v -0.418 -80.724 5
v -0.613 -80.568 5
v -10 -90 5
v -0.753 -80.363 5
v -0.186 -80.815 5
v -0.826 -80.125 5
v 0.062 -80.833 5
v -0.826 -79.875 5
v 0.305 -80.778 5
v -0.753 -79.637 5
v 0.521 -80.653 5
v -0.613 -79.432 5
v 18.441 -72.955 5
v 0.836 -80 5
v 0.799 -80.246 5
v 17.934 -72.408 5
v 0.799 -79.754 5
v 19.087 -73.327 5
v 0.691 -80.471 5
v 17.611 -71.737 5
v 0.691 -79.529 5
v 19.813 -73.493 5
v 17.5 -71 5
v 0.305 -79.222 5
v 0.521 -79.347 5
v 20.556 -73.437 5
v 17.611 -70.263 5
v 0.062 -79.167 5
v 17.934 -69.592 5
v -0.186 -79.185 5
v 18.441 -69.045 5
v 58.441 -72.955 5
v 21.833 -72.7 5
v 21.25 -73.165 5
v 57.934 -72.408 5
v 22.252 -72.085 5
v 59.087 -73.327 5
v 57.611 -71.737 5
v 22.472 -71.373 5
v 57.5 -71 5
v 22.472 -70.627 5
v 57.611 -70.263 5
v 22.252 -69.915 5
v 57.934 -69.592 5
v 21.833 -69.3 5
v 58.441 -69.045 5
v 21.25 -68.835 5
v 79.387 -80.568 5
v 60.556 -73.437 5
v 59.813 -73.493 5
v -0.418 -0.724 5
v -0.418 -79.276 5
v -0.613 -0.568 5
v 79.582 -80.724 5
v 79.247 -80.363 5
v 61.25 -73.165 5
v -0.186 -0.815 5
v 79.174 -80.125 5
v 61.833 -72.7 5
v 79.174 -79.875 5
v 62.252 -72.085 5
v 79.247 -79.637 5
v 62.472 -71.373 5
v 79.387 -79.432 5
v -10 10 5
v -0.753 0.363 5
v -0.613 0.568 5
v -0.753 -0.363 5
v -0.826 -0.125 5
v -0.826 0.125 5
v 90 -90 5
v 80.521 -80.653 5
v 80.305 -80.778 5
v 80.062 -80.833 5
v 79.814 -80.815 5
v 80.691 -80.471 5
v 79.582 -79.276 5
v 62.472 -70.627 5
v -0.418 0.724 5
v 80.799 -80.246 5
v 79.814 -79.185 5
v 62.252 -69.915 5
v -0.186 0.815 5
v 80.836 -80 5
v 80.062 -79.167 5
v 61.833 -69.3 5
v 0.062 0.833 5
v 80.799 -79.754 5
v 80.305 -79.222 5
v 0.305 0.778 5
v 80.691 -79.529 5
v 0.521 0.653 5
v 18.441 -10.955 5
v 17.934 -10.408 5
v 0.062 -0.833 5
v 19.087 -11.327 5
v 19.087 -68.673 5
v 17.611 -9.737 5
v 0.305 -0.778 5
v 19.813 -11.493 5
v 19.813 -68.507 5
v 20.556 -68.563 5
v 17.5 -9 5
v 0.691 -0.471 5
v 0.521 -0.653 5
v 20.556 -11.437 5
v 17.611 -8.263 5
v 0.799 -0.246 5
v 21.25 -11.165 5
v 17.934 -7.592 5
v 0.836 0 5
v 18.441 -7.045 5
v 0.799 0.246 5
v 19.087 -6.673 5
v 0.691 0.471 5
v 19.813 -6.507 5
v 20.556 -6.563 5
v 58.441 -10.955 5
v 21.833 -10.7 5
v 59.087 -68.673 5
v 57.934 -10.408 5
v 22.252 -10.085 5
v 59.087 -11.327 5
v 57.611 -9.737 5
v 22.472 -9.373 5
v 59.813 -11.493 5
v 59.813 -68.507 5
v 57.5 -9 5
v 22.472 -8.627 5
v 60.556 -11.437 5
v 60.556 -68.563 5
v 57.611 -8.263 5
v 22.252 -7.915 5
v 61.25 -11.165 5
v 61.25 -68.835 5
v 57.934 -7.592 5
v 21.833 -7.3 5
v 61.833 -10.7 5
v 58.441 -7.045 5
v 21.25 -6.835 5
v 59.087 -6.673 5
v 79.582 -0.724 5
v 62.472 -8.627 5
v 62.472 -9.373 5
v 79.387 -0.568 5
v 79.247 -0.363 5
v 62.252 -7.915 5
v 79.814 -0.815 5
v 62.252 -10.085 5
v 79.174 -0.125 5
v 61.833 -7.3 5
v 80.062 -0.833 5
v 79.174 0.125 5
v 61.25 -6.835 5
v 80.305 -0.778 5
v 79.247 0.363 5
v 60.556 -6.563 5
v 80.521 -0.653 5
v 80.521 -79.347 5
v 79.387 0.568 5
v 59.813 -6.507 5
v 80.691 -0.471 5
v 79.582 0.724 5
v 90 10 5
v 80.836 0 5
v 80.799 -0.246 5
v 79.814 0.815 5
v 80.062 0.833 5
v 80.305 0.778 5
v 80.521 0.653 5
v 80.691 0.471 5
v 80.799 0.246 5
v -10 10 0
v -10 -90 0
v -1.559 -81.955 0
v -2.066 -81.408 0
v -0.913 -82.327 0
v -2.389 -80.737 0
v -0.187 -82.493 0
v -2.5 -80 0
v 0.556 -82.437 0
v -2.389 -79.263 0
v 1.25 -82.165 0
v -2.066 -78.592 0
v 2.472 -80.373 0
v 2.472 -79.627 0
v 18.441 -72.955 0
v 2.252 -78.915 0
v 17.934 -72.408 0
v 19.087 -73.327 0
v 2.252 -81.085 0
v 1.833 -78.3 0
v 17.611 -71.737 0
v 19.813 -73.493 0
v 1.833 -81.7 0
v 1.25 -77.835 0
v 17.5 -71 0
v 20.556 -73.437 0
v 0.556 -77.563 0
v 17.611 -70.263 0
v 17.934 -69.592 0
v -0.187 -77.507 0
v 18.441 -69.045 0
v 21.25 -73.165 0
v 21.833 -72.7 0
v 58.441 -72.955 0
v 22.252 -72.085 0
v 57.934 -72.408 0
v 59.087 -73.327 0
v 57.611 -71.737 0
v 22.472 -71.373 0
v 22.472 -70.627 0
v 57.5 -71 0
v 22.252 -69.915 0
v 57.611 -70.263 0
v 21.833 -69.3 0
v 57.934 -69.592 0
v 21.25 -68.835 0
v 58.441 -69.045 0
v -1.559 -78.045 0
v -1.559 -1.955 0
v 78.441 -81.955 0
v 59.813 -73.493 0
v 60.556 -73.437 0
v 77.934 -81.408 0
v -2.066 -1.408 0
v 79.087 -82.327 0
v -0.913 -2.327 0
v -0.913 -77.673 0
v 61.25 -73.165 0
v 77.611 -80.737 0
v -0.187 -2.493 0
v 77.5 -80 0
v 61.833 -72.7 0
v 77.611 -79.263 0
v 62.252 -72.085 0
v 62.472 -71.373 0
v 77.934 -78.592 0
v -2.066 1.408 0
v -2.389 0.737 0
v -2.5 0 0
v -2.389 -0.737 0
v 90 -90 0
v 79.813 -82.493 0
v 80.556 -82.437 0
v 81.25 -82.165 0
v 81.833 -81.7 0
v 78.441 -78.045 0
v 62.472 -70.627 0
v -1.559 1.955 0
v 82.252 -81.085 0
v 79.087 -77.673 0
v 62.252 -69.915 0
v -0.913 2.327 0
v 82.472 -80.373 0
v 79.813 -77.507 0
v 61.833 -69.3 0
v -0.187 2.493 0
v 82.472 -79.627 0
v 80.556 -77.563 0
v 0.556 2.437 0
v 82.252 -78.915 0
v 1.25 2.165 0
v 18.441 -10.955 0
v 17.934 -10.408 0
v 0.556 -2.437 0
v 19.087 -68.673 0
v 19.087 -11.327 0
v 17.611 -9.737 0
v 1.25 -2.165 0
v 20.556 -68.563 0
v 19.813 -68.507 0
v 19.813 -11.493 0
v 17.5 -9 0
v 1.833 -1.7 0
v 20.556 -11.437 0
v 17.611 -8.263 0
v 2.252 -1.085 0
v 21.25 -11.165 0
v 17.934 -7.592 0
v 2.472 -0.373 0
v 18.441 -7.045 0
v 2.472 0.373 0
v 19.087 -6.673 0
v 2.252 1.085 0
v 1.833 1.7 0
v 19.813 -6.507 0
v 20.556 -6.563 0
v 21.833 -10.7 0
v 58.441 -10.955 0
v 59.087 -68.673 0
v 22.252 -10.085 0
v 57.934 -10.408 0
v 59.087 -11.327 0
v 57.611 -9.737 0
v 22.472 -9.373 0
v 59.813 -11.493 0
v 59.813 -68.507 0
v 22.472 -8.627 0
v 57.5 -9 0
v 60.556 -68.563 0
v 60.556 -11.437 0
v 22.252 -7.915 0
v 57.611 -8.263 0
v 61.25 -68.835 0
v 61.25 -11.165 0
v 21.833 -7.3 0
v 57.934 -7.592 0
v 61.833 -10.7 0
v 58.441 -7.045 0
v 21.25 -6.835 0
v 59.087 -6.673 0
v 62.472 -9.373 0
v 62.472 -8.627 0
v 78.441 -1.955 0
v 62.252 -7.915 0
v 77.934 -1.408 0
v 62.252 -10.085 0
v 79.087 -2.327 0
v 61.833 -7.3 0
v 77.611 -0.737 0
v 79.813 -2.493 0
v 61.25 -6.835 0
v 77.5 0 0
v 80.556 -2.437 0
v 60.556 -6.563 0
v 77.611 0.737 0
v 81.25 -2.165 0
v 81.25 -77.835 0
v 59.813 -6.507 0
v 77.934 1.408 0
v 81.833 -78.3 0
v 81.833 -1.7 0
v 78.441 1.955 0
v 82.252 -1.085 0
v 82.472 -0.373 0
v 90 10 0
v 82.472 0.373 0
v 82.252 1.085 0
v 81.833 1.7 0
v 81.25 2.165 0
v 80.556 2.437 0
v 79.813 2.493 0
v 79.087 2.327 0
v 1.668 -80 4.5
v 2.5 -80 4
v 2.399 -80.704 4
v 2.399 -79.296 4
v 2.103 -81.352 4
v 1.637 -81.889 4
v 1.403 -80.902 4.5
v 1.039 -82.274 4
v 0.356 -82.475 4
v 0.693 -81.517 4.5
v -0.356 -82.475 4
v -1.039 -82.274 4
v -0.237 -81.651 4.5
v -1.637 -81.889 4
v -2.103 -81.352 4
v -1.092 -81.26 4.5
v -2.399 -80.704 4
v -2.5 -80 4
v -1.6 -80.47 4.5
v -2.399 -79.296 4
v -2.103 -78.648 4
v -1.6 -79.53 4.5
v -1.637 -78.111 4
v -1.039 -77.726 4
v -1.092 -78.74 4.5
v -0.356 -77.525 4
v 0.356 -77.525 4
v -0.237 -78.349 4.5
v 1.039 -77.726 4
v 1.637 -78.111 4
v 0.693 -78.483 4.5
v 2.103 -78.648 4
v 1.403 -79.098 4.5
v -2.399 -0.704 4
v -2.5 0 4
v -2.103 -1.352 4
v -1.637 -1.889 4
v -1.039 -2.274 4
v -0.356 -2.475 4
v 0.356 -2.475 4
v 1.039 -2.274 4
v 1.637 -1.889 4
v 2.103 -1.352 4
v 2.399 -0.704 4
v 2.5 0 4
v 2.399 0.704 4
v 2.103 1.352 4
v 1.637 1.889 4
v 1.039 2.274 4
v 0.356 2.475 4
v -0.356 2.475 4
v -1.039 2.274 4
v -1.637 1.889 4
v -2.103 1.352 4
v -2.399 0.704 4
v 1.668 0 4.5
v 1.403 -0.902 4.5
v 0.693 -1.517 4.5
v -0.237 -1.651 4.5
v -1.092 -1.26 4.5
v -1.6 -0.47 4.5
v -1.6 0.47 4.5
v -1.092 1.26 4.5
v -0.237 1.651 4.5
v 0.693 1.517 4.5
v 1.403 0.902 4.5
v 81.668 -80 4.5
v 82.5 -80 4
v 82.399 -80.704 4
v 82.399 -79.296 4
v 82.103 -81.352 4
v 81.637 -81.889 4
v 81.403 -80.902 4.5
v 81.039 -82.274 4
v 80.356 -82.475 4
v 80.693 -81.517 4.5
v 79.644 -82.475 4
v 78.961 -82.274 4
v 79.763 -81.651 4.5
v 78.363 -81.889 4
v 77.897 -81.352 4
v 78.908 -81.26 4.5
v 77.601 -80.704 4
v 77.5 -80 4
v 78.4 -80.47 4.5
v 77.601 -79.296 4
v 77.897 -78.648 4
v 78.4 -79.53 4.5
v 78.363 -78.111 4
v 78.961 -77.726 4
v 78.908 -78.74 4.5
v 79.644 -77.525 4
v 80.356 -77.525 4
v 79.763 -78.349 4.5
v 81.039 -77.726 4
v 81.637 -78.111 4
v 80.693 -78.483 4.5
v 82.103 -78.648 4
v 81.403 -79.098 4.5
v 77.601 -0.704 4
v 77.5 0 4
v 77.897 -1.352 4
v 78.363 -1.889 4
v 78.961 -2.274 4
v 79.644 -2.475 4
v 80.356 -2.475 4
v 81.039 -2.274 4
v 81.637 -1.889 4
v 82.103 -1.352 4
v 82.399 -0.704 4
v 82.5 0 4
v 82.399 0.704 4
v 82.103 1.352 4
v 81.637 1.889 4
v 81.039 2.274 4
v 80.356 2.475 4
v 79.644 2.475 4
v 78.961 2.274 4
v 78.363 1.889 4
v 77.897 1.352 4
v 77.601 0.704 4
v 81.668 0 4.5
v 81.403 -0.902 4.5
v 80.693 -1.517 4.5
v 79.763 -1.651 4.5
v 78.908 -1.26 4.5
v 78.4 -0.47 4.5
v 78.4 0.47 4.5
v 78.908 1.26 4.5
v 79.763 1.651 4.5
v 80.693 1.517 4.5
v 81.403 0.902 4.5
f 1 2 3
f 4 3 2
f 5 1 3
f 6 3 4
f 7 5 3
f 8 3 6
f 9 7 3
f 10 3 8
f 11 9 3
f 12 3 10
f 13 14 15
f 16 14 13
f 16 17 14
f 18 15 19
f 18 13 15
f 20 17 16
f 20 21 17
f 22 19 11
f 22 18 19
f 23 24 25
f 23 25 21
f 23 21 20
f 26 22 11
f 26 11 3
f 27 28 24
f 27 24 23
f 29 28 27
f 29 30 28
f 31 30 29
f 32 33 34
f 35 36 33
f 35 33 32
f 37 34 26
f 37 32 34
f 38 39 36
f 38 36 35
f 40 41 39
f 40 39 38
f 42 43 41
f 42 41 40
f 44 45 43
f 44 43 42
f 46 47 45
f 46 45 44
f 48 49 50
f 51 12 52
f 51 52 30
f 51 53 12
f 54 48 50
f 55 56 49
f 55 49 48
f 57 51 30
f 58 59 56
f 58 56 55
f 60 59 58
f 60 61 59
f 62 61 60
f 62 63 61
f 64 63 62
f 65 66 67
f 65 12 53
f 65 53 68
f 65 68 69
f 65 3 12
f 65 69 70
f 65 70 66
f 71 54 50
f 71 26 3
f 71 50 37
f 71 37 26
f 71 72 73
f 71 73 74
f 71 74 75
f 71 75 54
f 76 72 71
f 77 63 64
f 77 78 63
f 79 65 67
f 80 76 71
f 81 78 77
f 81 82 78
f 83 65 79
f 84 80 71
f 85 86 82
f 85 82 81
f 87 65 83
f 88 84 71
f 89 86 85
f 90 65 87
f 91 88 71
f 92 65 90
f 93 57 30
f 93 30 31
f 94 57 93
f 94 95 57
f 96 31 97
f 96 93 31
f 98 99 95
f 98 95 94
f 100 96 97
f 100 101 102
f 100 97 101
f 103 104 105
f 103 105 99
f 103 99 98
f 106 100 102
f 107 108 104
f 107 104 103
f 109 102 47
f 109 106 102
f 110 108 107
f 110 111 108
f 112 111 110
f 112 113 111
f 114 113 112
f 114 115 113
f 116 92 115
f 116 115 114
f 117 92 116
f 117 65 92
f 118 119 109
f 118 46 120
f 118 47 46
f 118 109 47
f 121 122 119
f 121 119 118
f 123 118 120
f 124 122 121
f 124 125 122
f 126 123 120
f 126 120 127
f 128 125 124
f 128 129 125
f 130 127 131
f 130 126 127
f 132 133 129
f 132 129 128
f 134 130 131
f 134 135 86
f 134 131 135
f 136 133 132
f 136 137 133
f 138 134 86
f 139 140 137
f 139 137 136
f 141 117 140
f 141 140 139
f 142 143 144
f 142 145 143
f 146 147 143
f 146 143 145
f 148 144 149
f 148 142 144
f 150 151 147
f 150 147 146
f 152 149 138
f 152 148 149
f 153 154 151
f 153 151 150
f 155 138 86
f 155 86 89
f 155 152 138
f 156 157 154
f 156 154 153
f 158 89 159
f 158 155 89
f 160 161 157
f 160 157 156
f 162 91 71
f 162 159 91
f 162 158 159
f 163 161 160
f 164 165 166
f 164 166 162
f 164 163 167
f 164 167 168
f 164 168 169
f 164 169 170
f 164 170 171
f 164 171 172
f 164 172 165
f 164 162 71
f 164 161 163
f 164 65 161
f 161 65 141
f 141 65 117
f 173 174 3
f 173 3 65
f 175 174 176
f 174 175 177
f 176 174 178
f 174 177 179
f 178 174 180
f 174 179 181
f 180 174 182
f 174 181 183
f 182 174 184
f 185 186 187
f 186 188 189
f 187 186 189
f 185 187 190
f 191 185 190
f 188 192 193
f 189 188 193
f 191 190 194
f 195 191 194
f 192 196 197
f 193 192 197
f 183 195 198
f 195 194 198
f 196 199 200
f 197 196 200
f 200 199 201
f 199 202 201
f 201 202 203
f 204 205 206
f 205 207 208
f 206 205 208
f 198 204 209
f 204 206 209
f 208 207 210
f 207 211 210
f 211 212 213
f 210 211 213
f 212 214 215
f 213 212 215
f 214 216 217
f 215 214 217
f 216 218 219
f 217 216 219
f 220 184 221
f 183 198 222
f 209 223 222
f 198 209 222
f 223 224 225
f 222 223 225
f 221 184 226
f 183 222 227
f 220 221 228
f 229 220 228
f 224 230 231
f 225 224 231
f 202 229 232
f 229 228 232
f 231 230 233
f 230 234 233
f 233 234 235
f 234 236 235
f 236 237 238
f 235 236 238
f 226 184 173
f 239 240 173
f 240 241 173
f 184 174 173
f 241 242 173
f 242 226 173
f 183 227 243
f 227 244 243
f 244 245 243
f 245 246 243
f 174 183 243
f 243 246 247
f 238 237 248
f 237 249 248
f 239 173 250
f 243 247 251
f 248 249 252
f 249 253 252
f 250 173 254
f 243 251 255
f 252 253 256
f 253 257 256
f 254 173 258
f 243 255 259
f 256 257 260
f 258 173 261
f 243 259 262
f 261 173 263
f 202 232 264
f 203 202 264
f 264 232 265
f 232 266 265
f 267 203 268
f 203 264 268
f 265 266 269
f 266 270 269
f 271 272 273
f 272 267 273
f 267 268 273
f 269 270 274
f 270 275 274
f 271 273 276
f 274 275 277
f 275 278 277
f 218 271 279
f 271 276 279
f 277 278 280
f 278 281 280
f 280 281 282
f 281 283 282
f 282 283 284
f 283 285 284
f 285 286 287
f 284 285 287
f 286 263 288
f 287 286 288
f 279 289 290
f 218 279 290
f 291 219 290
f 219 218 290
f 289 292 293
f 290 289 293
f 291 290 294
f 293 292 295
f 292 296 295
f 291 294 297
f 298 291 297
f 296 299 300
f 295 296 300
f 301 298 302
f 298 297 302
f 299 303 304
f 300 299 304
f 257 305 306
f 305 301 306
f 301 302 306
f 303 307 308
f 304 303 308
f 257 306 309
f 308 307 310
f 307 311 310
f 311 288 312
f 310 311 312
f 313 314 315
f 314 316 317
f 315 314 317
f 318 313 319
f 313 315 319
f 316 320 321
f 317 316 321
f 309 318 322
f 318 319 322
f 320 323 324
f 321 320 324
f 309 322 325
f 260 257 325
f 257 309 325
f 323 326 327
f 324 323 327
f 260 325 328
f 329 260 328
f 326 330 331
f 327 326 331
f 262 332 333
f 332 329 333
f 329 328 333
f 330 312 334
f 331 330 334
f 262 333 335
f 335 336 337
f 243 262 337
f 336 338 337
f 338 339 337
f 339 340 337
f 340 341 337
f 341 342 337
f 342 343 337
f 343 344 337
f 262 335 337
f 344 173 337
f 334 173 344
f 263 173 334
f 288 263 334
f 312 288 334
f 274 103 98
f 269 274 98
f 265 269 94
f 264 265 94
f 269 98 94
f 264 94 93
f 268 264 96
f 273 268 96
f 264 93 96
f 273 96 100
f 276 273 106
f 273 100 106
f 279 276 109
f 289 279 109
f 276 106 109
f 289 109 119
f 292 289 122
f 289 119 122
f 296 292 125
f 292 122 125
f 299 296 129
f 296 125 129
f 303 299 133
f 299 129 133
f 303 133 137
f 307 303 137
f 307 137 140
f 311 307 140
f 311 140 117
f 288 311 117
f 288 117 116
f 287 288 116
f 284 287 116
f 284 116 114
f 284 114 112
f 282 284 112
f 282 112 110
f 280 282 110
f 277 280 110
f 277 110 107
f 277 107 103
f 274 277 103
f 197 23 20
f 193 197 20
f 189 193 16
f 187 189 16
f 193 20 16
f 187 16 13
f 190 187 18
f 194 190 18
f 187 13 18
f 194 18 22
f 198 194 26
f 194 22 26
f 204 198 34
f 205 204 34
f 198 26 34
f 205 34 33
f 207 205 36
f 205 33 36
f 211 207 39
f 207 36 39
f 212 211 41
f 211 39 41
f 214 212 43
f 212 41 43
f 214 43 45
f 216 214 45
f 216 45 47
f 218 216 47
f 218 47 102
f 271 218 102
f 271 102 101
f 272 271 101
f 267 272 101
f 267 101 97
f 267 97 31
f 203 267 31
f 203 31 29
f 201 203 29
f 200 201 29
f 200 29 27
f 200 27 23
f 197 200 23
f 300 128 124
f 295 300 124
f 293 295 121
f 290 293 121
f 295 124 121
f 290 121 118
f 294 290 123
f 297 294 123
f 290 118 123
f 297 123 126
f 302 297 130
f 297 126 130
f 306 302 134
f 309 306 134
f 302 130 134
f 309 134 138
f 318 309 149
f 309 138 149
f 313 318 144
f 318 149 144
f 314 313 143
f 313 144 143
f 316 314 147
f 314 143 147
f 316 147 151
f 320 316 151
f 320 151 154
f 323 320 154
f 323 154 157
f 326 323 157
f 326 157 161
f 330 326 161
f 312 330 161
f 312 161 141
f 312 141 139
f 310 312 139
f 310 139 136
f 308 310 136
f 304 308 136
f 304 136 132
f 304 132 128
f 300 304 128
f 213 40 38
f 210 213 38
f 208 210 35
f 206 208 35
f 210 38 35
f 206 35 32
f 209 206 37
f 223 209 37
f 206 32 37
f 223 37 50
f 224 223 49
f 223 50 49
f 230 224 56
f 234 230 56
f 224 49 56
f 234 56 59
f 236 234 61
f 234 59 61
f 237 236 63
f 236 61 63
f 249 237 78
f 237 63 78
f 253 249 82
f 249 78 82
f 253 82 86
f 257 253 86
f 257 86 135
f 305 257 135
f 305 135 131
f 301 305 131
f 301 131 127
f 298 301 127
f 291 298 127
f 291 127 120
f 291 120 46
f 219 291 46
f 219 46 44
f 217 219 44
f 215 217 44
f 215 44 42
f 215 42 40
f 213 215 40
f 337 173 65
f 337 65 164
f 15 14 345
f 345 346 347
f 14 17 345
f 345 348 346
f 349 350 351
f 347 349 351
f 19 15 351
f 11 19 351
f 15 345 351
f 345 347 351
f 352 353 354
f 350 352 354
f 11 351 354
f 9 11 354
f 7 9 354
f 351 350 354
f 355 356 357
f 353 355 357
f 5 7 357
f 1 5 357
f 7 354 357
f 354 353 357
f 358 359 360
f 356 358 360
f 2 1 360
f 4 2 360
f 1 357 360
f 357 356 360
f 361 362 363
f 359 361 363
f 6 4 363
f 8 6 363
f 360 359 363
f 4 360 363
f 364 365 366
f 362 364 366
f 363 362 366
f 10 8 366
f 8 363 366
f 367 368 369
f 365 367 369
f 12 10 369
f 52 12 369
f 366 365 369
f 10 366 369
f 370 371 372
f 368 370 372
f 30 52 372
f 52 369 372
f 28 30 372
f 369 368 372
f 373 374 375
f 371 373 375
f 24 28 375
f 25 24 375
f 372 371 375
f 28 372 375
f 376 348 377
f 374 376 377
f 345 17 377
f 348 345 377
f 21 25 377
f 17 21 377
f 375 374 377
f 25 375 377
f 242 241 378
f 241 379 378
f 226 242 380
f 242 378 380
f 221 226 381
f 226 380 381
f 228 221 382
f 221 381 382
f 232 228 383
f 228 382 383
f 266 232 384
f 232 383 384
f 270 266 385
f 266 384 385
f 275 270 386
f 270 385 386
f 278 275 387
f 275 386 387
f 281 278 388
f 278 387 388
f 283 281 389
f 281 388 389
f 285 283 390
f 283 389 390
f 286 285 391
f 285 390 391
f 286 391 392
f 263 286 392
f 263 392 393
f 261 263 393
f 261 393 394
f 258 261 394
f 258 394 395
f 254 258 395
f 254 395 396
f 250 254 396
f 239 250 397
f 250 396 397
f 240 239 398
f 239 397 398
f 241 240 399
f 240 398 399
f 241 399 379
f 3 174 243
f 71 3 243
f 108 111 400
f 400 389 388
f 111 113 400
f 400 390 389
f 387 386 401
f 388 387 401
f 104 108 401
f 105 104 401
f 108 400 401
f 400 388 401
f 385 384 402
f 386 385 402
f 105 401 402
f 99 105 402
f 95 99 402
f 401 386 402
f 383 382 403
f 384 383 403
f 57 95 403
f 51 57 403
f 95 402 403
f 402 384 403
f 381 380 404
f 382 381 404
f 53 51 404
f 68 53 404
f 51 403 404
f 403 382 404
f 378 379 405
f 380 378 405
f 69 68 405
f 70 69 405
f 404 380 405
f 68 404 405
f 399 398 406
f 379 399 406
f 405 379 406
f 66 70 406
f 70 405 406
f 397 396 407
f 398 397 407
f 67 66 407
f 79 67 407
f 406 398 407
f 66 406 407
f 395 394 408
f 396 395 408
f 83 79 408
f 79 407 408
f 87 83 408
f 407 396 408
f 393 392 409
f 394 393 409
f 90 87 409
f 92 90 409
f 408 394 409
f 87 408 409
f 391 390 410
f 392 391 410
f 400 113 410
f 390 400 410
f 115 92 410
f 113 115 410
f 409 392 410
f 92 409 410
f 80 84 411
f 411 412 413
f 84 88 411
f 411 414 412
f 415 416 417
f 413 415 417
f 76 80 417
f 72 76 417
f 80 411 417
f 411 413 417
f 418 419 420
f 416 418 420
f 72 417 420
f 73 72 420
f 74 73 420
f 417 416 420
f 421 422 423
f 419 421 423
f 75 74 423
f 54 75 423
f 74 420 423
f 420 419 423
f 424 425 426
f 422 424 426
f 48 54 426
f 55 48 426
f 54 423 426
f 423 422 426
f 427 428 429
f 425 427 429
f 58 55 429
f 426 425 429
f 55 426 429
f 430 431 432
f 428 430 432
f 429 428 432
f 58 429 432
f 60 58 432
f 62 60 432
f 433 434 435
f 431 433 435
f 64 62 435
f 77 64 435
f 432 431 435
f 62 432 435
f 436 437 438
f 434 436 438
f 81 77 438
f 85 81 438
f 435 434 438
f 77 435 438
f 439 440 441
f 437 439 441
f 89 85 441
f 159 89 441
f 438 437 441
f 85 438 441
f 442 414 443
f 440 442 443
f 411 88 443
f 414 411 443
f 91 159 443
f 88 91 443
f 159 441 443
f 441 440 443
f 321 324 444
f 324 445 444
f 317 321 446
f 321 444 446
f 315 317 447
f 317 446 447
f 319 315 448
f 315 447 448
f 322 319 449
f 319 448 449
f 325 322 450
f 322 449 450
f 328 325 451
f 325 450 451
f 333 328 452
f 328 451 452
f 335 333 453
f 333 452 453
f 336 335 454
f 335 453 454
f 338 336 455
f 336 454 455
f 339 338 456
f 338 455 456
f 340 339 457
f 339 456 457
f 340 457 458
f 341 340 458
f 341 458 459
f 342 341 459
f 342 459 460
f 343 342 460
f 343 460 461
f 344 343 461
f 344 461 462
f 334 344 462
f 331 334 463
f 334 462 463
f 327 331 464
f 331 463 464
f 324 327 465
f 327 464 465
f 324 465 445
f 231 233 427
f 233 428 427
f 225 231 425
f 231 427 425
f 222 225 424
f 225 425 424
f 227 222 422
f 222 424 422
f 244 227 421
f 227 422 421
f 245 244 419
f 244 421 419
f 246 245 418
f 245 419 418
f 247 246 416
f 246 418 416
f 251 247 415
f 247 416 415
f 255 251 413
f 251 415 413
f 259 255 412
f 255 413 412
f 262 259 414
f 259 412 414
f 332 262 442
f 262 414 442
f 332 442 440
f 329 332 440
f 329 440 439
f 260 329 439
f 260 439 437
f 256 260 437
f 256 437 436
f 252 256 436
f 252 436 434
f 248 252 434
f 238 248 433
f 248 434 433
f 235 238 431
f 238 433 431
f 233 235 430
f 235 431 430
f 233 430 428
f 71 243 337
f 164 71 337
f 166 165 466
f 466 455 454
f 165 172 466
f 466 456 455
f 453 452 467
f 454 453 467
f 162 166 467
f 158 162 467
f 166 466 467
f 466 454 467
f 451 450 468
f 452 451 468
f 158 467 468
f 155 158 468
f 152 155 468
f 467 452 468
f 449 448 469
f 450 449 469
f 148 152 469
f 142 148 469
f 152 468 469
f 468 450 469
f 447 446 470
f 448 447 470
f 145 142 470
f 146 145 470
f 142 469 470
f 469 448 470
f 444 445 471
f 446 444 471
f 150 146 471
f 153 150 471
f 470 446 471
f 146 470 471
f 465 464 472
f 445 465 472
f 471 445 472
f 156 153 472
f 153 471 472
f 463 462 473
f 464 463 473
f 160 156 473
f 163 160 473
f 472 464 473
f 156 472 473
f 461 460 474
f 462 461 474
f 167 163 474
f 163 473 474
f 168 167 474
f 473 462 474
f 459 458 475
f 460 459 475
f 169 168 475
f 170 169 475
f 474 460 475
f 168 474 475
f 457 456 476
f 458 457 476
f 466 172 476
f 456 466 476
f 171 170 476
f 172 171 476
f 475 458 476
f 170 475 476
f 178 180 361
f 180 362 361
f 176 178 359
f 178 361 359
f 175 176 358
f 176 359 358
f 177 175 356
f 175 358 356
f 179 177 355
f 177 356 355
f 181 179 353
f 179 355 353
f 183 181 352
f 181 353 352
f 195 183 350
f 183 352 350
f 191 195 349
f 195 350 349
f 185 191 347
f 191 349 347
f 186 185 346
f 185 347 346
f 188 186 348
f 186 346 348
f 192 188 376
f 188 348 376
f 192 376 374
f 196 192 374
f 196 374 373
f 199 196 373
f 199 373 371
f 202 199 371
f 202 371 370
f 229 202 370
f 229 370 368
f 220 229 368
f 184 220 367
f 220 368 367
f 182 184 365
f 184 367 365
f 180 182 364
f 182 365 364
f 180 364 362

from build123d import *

# Parameters (mm, degrees)
F0_W     = 100
F0_H     = 100
F0_W_2   = 80
F0_H_2   = 80
F1_DEPTH = 5
F3_D     = 5
F4_D     = 5
F4_DEPTH = 4
F4_TIP   = 1.5021515476


with BuildPart() as f1:
    # F0 (on Top) → F1 (new body)
    with BuildSketch(Plane.XY):
        with Locations((40, -40)):
            Rectangle(F0_W, F0_H)
        with Locations((40, -40)):
            Rectangle(F0_W_2, F0_H_2, mode=Mode.SUBTRACT)
        with Locations((40, -40)):
            Rectangle(F0_W_2, F0_H_2)
    extrude(amount=F1_DEPTH)

    # F3 (through all)
    with Locations(Plane(origin=(0, 0, 0), x_dir=(1, 0, 0), z_dir=(0, 0, -1))):
        with Locations((20, 9), (60, 9), (60, 71), (20, 71)):
            Hole(F3_D / 2)

    # F4
    with Locations(Plane(origin=(0, 0, 0), x_dir=(1, 0, 0), z_dir=(0, 0, -1))):
        with Locations((0, 80), (80, 80), (80, 0), (0, 0)):
            Hole(F4_D / 2, depth=F4_DEPTH)
            with Locations((0, 0, -(F4_DEPTH + F4_TIP / 2))):  # 118° drill point
                Cone(0, F4_D / 2, F4_TIP, mode=Mode.SUBTRACT)


solid = f1.part
